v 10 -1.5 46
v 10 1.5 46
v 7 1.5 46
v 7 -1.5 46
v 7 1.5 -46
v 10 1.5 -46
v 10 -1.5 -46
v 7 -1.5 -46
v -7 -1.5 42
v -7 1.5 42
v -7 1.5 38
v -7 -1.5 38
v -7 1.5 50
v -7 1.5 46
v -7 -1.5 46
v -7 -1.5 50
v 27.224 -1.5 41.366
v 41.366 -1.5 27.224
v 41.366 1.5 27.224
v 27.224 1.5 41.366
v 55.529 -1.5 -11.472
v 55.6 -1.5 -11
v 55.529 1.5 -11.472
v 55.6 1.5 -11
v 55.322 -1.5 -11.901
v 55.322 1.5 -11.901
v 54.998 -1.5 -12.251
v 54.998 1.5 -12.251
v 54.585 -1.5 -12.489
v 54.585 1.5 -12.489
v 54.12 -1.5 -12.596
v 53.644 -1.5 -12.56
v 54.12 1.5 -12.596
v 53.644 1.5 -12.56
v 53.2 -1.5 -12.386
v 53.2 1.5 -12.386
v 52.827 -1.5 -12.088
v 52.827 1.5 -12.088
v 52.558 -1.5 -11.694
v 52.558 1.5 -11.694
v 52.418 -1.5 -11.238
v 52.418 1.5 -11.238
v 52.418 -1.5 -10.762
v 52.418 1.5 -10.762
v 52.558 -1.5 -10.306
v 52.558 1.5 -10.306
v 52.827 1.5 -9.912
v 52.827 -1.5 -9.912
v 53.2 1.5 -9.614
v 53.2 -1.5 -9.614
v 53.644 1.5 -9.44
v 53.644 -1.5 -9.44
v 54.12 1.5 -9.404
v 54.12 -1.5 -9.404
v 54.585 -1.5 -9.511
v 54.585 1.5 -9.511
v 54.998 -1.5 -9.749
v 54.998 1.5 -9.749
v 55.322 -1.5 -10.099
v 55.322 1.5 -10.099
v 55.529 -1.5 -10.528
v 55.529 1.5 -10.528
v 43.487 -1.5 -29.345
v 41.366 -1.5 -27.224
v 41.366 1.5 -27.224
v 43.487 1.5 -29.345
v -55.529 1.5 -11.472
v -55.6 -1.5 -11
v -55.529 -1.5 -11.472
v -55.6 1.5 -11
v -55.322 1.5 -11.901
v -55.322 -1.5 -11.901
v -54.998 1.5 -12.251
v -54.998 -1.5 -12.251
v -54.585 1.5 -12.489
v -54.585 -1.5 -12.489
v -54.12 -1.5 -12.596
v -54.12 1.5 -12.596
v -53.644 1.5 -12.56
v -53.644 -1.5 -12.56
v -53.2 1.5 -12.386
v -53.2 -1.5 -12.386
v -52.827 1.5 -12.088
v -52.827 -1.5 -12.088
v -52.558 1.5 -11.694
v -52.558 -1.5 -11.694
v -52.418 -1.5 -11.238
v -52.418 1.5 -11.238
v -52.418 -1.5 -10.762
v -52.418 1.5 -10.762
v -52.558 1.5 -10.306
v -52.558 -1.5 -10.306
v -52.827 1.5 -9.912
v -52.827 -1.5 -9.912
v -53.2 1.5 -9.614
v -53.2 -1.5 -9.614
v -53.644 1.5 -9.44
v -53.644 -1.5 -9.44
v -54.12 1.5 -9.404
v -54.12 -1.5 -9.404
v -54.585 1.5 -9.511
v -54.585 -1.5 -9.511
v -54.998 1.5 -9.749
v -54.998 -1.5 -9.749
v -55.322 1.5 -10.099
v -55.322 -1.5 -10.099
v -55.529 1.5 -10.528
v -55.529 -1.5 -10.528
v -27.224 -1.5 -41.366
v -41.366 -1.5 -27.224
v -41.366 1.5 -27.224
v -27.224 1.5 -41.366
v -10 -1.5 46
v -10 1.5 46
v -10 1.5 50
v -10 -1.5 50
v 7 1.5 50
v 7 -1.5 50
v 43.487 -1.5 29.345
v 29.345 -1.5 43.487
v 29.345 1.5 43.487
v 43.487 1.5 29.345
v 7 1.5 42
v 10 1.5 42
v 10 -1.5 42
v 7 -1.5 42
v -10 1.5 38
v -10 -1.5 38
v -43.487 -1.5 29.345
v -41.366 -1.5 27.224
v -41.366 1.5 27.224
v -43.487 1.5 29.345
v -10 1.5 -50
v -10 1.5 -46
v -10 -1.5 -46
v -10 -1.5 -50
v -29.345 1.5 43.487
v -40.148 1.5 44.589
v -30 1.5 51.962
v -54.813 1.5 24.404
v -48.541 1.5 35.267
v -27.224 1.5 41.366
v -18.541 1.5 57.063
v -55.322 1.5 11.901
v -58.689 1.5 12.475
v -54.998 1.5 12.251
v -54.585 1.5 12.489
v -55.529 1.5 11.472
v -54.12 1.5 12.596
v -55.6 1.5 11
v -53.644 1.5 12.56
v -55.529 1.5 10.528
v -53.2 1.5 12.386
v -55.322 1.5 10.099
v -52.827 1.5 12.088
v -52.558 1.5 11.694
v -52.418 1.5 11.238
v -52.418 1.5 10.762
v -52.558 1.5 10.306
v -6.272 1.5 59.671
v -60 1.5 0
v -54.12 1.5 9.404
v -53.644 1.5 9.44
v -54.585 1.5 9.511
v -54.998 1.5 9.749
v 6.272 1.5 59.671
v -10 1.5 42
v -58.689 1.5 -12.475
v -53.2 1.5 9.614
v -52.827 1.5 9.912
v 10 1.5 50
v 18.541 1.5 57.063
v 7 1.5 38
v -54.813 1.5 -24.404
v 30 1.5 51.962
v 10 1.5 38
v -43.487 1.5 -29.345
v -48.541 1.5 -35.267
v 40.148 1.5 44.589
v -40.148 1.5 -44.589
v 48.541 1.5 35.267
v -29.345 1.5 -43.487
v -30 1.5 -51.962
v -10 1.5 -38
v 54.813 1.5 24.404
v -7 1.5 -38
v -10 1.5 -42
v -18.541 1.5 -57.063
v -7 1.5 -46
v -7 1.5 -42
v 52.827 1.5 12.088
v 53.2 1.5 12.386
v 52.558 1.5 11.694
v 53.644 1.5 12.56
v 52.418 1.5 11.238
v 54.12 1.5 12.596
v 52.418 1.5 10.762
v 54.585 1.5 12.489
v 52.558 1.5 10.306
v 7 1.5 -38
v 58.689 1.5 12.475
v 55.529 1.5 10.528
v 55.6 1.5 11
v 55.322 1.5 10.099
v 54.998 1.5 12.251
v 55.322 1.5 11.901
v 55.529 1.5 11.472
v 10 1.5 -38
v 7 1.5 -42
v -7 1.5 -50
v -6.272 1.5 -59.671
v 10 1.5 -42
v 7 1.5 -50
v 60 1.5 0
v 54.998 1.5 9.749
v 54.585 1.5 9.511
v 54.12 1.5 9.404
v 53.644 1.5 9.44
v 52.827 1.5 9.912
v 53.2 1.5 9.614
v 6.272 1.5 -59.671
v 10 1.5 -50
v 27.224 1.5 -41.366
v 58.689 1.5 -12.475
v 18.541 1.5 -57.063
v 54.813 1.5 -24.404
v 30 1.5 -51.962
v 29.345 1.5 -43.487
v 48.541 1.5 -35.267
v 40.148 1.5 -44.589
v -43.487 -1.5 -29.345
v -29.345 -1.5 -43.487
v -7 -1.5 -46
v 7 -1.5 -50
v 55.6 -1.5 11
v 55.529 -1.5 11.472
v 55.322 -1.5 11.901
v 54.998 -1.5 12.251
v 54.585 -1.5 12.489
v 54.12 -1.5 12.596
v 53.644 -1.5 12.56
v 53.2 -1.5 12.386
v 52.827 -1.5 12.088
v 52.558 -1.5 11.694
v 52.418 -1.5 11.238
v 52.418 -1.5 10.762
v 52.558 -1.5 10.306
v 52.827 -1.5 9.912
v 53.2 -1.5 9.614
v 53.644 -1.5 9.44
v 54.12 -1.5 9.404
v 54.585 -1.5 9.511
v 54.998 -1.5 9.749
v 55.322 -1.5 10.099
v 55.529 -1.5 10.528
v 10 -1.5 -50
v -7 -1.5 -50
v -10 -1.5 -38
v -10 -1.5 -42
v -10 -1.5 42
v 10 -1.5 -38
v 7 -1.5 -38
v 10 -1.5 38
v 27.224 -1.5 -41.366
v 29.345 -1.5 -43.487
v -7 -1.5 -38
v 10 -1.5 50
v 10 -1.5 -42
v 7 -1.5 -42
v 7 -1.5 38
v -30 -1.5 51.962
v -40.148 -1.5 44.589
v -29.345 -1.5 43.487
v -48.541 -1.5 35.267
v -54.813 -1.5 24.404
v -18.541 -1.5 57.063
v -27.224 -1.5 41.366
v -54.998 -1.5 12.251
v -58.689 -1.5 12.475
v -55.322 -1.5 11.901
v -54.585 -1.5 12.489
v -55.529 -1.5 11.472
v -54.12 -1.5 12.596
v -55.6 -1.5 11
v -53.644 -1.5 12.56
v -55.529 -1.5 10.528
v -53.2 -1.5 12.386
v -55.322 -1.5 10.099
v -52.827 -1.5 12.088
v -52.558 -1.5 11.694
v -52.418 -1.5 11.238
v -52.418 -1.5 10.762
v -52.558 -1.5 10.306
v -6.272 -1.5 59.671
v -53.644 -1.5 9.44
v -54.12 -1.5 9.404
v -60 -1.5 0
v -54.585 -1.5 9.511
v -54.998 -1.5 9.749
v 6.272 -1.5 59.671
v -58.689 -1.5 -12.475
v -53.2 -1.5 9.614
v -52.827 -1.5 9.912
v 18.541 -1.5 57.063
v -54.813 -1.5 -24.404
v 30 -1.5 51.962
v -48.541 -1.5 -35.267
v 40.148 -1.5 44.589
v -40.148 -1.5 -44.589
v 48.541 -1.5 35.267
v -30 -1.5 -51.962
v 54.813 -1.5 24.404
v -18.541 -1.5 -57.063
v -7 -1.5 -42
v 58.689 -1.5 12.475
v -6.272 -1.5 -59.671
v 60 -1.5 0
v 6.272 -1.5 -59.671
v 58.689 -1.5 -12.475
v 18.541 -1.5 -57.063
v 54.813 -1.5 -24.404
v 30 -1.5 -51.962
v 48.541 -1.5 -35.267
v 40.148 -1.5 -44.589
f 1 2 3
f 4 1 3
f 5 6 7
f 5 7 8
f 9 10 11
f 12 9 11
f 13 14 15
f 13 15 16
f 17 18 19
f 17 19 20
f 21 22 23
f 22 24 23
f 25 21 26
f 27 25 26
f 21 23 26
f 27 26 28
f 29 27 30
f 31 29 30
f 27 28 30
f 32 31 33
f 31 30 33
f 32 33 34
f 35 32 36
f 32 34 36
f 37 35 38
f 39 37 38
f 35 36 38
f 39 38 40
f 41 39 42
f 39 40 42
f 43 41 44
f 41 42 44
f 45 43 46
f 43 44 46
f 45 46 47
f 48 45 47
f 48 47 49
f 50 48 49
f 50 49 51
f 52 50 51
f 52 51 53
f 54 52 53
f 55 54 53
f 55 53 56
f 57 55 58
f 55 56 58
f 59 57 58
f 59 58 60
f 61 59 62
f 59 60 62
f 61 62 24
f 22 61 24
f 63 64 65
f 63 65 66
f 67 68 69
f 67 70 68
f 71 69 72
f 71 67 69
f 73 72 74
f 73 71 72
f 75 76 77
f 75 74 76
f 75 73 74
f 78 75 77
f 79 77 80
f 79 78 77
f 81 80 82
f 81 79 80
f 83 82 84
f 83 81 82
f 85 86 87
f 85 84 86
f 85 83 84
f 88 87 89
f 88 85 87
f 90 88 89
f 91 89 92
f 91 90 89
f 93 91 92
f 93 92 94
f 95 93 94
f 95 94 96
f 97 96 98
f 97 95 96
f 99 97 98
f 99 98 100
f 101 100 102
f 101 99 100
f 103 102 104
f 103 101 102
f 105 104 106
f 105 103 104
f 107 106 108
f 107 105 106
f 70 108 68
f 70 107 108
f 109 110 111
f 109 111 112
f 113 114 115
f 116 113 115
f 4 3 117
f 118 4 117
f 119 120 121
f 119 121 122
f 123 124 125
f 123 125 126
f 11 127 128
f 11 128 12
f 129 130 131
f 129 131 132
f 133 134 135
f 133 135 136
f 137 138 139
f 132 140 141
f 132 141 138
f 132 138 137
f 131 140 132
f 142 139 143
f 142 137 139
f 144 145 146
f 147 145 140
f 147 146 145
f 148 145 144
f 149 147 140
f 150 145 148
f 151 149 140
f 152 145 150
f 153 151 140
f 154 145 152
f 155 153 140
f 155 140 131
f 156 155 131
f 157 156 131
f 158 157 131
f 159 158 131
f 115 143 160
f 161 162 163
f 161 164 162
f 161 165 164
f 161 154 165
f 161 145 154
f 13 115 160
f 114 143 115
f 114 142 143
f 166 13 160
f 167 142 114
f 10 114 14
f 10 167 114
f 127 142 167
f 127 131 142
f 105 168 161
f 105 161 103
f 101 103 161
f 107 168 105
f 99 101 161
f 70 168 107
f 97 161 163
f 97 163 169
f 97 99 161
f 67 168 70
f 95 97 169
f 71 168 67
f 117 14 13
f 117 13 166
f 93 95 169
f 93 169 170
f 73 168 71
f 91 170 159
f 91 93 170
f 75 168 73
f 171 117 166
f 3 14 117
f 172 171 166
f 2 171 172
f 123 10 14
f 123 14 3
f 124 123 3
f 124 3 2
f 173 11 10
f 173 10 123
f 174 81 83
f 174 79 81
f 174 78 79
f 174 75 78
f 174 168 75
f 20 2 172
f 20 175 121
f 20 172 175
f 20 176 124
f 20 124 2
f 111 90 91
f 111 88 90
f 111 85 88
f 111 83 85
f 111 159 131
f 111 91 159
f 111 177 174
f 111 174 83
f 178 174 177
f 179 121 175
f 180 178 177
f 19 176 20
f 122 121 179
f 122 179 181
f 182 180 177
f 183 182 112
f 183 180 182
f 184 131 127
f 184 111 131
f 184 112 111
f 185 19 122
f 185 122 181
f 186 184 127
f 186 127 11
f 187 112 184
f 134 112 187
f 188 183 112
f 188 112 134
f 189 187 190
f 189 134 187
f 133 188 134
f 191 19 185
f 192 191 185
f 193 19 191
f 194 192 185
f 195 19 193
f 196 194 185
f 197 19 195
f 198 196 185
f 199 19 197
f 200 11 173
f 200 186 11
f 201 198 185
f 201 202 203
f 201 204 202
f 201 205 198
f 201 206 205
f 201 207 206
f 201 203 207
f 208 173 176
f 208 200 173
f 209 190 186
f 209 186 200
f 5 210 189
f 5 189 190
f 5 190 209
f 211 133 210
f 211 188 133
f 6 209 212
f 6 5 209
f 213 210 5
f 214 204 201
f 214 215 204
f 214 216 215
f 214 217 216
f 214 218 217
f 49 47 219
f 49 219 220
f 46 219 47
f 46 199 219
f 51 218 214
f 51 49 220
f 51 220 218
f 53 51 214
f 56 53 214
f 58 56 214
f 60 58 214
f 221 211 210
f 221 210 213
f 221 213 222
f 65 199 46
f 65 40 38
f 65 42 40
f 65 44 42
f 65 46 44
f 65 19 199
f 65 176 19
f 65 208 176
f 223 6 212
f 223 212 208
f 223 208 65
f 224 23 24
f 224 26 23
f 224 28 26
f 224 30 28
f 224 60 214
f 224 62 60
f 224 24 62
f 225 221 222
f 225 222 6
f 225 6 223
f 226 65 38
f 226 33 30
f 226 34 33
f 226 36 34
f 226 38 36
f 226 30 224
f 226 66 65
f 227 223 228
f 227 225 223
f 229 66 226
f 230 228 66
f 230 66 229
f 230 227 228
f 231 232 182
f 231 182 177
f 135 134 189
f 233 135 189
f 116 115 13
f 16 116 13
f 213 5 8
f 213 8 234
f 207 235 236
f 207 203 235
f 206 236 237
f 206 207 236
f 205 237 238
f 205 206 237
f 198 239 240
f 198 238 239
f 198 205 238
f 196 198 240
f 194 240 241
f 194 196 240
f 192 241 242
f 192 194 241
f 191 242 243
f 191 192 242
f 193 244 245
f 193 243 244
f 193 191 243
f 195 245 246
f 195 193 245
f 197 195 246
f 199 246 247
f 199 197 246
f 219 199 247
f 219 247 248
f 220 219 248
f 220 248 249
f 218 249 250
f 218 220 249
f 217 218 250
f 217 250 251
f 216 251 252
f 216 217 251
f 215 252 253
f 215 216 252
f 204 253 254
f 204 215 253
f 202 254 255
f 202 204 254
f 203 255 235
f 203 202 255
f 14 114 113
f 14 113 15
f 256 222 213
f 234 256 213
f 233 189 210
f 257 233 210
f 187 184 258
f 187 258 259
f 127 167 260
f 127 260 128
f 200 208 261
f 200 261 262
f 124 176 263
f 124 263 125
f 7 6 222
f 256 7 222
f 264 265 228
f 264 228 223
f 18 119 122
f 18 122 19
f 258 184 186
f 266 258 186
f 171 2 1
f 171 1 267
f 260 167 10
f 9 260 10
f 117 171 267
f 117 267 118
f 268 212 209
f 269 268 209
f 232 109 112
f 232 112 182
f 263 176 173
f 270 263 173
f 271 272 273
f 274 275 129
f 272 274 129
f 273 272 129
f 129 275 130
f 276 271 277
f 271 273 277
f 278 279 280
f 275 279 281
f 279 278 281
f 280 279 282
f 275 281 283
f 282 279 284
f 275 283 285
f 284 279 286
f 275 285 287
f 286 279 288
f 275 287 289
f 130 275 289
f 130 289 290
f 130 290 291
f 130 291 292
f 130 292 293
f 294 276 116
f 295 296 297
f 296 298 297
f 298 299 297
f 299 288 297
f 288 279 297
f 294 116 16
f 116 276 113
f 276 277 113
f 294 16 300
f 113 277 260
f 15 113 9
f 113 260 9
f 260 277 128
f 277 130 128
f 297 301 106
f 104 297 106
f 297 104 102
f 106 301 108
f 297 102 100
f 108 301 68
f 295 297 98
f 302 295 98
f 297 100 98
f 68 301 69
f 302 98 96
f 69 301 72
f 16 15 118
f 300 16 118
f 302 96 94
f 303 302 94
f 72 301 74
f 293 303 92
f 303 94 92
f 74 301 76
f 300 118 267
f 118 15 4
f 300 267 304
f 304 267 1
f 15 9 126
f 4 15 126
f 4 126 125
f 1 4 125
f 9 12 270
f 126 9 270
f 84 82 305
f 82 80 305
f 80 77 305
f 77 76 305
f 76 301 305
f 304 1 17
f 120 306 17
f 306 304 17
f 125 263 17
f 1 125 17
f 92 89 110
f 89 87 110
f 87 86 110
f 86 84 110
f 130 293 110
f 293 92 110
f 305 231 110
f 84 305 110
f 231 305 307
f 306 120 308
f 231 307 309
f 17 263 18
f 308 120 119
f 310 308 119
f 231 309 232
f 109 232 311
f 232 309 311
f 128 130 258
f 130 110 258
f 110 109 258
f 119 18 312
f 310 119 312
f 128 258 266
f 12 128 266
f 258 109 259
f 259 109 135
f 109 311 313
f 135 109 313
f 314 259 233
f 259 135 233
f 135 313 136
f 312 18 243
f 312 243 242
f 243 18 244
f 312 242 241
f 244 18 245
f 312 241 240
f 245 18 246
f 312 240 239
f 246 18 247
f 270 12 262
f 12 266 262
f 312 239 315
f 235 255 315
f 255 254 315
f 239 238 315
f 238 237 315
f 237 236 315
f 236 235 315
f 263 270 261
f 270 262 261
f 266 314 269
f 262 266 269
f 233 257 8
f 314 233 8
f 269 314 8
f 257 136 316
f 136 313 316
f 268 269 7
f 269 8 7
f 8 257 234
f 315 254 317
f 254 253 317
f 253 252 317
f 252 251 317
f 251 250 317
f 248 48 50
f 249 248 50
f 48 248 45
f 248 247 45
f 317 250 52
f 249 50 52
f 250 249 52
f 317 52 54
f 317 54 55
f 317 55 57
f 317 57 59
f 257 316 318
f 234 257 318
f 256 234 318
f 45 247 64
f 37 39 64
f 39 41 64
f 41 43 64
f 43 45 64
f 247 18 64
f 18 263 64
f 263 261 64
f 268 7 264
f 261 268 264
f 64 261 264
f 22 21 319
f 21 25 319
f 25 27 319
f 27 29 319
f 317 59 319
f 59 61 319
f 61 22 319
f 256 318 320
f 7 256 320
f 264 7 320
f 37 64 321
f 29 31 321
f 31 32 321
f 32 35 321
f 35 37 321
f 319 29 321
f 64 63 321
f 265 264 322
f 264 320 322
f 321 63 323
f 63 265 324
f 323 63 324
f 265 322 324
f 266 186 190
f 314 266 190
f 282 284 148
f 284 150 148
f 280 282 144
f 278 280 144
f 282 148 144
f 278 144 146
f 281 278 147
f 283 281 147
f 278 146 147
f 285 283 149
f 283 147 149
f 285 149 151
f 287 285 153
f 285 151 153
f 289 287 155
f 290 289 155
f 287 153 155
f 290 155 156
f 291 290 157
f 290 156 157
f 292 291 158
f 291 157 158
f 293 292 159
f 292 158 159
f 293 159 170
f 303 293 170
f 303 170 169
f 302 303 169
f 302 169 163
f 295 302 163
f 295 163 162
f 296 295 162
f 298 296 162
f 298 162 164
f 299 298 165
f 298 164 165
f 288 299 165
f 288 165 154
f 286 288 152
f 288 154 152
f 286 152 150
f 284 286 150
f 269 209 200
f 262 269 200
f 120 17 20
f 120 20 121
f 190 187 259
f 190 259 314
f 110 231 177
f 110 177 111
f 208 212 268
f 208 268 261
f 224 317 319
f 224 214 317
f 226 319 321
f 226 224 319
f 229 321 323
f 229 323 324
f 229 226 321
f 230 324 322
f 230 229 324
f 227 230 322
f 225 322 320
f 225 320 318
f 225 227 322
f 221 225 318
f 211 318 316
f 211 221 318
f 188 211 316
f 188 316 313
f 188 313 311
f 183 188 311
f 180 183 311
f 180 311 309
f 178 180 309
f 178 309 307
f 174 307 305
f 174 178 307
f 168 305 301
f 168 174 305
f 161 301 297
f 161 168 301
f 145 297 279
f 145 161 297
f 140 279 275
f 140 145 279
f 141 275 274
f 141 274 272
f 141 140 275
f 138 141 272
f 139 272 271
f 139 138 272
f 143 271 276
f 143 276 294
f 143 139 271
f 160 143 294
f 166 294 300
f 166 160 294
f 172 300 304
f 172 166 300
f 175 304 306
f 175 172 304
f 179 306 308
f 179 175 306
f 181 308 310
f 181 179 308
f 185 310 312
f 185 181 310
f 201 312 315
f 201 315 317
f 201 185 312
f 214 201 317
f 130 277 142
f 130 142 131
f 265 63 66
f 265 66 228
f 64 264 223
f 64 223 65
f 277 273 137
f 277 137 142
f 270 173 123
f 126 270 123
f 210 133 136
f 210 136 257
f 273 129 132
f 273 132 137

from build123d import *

# Parameters (mm, degrees)
SKETCH1_R               = 60
BOSS_EXTRUDE1_DEPTH     = 1.5
SKETCH2_R               = 1.6
CUT_EXTRUDE1_DEPTH      = 2.5
MIRROR2_COPY_1_SKETCH_R = 1.6
MIRROR2_COPY_1_DEPTH    = 2.5
SKETCH3_W               = 3
SKETCH3_H               = 4
CUT_EXTRUDE2_DEPTH      = 4
LPATTERN1_COUNT         = 2
LPATTERN1_PITCH         = 8
MIRROR3_COPY_1_SKETCH_W = 3
MIRROR3_COPY_1_SKETCH_H = 4
MIRROR3_COPY_1_DEPTH    = 4
MIRROR4_COPY_1_SKETCH_W = 3
MIRROR4_COPY_1_SKETCH_H = 4
MIRROR4_COPY_1_DEPTH    = 4
MIRROR4_COPY_2_SKETCH_W = 3
MIRROR4_COPY_2_SKETCH_H = 4
MIRROR4_COPY_2_DEPTH    = 4
MIRROR4_COPY_3_SKETCH_W = 3
MIRROR4_COPY_3_SKETCH_H = 4
MIRROR4_COPY_3_DEPTH    = 4
CUT_EXTRUDE3_START      = -4
CUT_EXTRUDE3_DEPTH      = 5
CIRPATTERN1_COUNT       = 4


with BuildPart() as part:
    # Sketch1 → Boss-Extrude1 (new body, symmetric)
    with BuildSketch(Plane(origin=(0, 0, 0), x_dir=(1, 0, 0), z_dir=(0, 1, 0))):
        Circle(SKETCH1_R)
    extrude(amount=BOSS_EXTRUDE1_DEPTH, both=True)

    # Sketch2 → Cut-Extrude1 (cut, symmetric)
    with BuildSketch(Plane(origin=(0, 0, 0), x_dir=(1, 0, 0), z_dir=(0, 1, 0))):
        with Locations((54, 11)):
            Circle(SKETCH2_R)
    cut_extrude1 = extrude(amount=CUT_EXTRUDE1_DEPTH, both=True, mode=Mode.SUBTRACT)

    # Mirror1: Cut-Extrude1 across plane
    add(cut_extrude1.mirror(Plane(origin=(0, 0, 0), x_dir=(0, 0, 1), z_dir=(1, 0, 0))), mode=Mode.SUBTRACT)

    # Mirror2: Cut-Extrude1 across plane
    add(cut_extrude1.mirror(Plane.XY), mode=Mode.SUBTRACT)

    # Mirror2 copy 1 sketch → Mirror2 copy 1 (cut, symmetric)
    with BuildSketch(Plane(origin=(0, 0, 0), x_dir=(-1, 0, 0), z_dir=(0, 1, 0))):
        with Locations((54, 11)):
            Circle(MIRROR2_COPY_1_SKETCH_R)
    extrude(amount=MIRROR2_COPY_1_DEPTH, both=True, mode=Mode.SUBTRACT)

    # Sketch3 → Cut-Extrude2 (cut, through all)
    with BuildSketch(Plane(origin=(0, 1.5, 0), x_dir=(1, 0, 0), z_dir=(0, 1, 0))):
        with Locations((-8.5, 48)):
            Rectangle(SKETCH3_W, SKETCH3_H)
    cut_extrude2 = extrude(amount=-CUT_EXTRUDE2_DEPTH, mode=Mode.SUBTRACT)

    # LPattern1: Cut-Extrude2 ×2
    with Locations(*[(0, 0, i * LPATTERN1_PITCH) for i in range(1, LPATTERN1_COUNT)]):
        add(cut_extrude2, mode=Mode.SUBTRACT)

    # Mirror3: Cut-Extrude2 across plane
    add(cut_extrude2.mirror(Plane(origin=(0, 0, 0), x_dir=(0, 0, 1), z_dir=(1, 0, 0))), mode=Mode.SUBTRACT)

    # Mirror3 copy 1 sketch → Mirror3 copy 1 (cut, through all)
    with BuildSketch(Plane(origin=(0, 1.5, 8), x_dir=(-1, 0, 0), z_dir=(0, 1, 0))):
        with Locations((-8.5, -48)):
            Rectangle(MIRROR3_COPY_1_SKETCH_W, MIRROR3_COPY_1_SKETCH_H)
    extrude(amount=-MIRROR3_COPY_1_DEPTH, mode=Mode.SUBTRACT)

    # Mirror4: Cut-Extrude2 across plane
    add(cut_extrude2.mirror(Plane.XY), mode=Mode.SUBTRACT)

    # Mirror4 copy 1 sketch → Mirror4 copy 1 (cut, through all)
    with BuildSketch(Plane(origin=(0, 1.5, 0), x_dir=(-1, 0, 0), z_dir=(0, 1, 0))):
        with Locations((-8.5, 48)):
            Rectangle(MIRROR4_COPY_1_SKETCH_W, MIRROR4_COPY_1_SKETCH_H)
    extrude(amount=-MIRROR4_COPY_1_DEPTH, mode=Mode.SUBTRACT)

    # Mirror4 copy 2 sketch → Mirror4 copy 2 (cut, through all)
    with BuildSketch(Plane(origin=(0, 1.5, -8), x_dir=(-1, 0, 0), z_dir=(0, 1, 0))):
        with Locations((-8.5, 48)):
            Rectangle(MIRROR4_COPY_2_SKETCH_W, MIRROR4_COPY_2_SKETCH_H)
    extrude(amount=-MIRROR4_COPY_2_DEPTH, mode=Mode.SUBTRACT)

    # Mirror4 copy 3 sketch → Mirror4 copy 3 (cut, through all)
    with BuildSketch(Plane(origin=(0, 1.5, -8), x_dir=(1, 0, 0), z_dir=(0, 1, 0))):
        with Locations((-8.5, -48)):
            Rectangle(MIRROR4_COPY_3_SKETCH_W, MIRROR4_COPY_3_SKETCH_H)
    extrude(amount=-MIRROR4_COPY_3_DEPTH, mode=Mode.SUBTRACT)

    # Sketch4 → Cut-Extrude3 (cut)
    with BuildSketch(Plane(origin=(0, 1.5, 0), x_dir=(1, 0, 0), z_dir=(0, 1, 0)).offset(CUT_EXTRUDE3_START)):
        Polygon((27.223611076, 41.365746699), (41.365746699, 27.223611076), (43.487067043, 29.344931419), (29.344931419, 43.487067043), align=None)
    cut_extrude3 = extrude(amount=CUT_EXTRUDE3_DEPTH, mode=Mode.SUBTRACT)

    # CirPattern1: Cut-Extrude3 ×4 about axis
    cirpattern1_axis = Axis((0, 0, 0), (0, 1, 0))
    for i in range(1, CIRPATTERN1_COUNT):
        add(cut_extrude3.rotate(cirpattern1_axis, i * 360 / CIRPATTERN1_COUNT), mode=Mode.SUBTRACT)


solid = part.part
